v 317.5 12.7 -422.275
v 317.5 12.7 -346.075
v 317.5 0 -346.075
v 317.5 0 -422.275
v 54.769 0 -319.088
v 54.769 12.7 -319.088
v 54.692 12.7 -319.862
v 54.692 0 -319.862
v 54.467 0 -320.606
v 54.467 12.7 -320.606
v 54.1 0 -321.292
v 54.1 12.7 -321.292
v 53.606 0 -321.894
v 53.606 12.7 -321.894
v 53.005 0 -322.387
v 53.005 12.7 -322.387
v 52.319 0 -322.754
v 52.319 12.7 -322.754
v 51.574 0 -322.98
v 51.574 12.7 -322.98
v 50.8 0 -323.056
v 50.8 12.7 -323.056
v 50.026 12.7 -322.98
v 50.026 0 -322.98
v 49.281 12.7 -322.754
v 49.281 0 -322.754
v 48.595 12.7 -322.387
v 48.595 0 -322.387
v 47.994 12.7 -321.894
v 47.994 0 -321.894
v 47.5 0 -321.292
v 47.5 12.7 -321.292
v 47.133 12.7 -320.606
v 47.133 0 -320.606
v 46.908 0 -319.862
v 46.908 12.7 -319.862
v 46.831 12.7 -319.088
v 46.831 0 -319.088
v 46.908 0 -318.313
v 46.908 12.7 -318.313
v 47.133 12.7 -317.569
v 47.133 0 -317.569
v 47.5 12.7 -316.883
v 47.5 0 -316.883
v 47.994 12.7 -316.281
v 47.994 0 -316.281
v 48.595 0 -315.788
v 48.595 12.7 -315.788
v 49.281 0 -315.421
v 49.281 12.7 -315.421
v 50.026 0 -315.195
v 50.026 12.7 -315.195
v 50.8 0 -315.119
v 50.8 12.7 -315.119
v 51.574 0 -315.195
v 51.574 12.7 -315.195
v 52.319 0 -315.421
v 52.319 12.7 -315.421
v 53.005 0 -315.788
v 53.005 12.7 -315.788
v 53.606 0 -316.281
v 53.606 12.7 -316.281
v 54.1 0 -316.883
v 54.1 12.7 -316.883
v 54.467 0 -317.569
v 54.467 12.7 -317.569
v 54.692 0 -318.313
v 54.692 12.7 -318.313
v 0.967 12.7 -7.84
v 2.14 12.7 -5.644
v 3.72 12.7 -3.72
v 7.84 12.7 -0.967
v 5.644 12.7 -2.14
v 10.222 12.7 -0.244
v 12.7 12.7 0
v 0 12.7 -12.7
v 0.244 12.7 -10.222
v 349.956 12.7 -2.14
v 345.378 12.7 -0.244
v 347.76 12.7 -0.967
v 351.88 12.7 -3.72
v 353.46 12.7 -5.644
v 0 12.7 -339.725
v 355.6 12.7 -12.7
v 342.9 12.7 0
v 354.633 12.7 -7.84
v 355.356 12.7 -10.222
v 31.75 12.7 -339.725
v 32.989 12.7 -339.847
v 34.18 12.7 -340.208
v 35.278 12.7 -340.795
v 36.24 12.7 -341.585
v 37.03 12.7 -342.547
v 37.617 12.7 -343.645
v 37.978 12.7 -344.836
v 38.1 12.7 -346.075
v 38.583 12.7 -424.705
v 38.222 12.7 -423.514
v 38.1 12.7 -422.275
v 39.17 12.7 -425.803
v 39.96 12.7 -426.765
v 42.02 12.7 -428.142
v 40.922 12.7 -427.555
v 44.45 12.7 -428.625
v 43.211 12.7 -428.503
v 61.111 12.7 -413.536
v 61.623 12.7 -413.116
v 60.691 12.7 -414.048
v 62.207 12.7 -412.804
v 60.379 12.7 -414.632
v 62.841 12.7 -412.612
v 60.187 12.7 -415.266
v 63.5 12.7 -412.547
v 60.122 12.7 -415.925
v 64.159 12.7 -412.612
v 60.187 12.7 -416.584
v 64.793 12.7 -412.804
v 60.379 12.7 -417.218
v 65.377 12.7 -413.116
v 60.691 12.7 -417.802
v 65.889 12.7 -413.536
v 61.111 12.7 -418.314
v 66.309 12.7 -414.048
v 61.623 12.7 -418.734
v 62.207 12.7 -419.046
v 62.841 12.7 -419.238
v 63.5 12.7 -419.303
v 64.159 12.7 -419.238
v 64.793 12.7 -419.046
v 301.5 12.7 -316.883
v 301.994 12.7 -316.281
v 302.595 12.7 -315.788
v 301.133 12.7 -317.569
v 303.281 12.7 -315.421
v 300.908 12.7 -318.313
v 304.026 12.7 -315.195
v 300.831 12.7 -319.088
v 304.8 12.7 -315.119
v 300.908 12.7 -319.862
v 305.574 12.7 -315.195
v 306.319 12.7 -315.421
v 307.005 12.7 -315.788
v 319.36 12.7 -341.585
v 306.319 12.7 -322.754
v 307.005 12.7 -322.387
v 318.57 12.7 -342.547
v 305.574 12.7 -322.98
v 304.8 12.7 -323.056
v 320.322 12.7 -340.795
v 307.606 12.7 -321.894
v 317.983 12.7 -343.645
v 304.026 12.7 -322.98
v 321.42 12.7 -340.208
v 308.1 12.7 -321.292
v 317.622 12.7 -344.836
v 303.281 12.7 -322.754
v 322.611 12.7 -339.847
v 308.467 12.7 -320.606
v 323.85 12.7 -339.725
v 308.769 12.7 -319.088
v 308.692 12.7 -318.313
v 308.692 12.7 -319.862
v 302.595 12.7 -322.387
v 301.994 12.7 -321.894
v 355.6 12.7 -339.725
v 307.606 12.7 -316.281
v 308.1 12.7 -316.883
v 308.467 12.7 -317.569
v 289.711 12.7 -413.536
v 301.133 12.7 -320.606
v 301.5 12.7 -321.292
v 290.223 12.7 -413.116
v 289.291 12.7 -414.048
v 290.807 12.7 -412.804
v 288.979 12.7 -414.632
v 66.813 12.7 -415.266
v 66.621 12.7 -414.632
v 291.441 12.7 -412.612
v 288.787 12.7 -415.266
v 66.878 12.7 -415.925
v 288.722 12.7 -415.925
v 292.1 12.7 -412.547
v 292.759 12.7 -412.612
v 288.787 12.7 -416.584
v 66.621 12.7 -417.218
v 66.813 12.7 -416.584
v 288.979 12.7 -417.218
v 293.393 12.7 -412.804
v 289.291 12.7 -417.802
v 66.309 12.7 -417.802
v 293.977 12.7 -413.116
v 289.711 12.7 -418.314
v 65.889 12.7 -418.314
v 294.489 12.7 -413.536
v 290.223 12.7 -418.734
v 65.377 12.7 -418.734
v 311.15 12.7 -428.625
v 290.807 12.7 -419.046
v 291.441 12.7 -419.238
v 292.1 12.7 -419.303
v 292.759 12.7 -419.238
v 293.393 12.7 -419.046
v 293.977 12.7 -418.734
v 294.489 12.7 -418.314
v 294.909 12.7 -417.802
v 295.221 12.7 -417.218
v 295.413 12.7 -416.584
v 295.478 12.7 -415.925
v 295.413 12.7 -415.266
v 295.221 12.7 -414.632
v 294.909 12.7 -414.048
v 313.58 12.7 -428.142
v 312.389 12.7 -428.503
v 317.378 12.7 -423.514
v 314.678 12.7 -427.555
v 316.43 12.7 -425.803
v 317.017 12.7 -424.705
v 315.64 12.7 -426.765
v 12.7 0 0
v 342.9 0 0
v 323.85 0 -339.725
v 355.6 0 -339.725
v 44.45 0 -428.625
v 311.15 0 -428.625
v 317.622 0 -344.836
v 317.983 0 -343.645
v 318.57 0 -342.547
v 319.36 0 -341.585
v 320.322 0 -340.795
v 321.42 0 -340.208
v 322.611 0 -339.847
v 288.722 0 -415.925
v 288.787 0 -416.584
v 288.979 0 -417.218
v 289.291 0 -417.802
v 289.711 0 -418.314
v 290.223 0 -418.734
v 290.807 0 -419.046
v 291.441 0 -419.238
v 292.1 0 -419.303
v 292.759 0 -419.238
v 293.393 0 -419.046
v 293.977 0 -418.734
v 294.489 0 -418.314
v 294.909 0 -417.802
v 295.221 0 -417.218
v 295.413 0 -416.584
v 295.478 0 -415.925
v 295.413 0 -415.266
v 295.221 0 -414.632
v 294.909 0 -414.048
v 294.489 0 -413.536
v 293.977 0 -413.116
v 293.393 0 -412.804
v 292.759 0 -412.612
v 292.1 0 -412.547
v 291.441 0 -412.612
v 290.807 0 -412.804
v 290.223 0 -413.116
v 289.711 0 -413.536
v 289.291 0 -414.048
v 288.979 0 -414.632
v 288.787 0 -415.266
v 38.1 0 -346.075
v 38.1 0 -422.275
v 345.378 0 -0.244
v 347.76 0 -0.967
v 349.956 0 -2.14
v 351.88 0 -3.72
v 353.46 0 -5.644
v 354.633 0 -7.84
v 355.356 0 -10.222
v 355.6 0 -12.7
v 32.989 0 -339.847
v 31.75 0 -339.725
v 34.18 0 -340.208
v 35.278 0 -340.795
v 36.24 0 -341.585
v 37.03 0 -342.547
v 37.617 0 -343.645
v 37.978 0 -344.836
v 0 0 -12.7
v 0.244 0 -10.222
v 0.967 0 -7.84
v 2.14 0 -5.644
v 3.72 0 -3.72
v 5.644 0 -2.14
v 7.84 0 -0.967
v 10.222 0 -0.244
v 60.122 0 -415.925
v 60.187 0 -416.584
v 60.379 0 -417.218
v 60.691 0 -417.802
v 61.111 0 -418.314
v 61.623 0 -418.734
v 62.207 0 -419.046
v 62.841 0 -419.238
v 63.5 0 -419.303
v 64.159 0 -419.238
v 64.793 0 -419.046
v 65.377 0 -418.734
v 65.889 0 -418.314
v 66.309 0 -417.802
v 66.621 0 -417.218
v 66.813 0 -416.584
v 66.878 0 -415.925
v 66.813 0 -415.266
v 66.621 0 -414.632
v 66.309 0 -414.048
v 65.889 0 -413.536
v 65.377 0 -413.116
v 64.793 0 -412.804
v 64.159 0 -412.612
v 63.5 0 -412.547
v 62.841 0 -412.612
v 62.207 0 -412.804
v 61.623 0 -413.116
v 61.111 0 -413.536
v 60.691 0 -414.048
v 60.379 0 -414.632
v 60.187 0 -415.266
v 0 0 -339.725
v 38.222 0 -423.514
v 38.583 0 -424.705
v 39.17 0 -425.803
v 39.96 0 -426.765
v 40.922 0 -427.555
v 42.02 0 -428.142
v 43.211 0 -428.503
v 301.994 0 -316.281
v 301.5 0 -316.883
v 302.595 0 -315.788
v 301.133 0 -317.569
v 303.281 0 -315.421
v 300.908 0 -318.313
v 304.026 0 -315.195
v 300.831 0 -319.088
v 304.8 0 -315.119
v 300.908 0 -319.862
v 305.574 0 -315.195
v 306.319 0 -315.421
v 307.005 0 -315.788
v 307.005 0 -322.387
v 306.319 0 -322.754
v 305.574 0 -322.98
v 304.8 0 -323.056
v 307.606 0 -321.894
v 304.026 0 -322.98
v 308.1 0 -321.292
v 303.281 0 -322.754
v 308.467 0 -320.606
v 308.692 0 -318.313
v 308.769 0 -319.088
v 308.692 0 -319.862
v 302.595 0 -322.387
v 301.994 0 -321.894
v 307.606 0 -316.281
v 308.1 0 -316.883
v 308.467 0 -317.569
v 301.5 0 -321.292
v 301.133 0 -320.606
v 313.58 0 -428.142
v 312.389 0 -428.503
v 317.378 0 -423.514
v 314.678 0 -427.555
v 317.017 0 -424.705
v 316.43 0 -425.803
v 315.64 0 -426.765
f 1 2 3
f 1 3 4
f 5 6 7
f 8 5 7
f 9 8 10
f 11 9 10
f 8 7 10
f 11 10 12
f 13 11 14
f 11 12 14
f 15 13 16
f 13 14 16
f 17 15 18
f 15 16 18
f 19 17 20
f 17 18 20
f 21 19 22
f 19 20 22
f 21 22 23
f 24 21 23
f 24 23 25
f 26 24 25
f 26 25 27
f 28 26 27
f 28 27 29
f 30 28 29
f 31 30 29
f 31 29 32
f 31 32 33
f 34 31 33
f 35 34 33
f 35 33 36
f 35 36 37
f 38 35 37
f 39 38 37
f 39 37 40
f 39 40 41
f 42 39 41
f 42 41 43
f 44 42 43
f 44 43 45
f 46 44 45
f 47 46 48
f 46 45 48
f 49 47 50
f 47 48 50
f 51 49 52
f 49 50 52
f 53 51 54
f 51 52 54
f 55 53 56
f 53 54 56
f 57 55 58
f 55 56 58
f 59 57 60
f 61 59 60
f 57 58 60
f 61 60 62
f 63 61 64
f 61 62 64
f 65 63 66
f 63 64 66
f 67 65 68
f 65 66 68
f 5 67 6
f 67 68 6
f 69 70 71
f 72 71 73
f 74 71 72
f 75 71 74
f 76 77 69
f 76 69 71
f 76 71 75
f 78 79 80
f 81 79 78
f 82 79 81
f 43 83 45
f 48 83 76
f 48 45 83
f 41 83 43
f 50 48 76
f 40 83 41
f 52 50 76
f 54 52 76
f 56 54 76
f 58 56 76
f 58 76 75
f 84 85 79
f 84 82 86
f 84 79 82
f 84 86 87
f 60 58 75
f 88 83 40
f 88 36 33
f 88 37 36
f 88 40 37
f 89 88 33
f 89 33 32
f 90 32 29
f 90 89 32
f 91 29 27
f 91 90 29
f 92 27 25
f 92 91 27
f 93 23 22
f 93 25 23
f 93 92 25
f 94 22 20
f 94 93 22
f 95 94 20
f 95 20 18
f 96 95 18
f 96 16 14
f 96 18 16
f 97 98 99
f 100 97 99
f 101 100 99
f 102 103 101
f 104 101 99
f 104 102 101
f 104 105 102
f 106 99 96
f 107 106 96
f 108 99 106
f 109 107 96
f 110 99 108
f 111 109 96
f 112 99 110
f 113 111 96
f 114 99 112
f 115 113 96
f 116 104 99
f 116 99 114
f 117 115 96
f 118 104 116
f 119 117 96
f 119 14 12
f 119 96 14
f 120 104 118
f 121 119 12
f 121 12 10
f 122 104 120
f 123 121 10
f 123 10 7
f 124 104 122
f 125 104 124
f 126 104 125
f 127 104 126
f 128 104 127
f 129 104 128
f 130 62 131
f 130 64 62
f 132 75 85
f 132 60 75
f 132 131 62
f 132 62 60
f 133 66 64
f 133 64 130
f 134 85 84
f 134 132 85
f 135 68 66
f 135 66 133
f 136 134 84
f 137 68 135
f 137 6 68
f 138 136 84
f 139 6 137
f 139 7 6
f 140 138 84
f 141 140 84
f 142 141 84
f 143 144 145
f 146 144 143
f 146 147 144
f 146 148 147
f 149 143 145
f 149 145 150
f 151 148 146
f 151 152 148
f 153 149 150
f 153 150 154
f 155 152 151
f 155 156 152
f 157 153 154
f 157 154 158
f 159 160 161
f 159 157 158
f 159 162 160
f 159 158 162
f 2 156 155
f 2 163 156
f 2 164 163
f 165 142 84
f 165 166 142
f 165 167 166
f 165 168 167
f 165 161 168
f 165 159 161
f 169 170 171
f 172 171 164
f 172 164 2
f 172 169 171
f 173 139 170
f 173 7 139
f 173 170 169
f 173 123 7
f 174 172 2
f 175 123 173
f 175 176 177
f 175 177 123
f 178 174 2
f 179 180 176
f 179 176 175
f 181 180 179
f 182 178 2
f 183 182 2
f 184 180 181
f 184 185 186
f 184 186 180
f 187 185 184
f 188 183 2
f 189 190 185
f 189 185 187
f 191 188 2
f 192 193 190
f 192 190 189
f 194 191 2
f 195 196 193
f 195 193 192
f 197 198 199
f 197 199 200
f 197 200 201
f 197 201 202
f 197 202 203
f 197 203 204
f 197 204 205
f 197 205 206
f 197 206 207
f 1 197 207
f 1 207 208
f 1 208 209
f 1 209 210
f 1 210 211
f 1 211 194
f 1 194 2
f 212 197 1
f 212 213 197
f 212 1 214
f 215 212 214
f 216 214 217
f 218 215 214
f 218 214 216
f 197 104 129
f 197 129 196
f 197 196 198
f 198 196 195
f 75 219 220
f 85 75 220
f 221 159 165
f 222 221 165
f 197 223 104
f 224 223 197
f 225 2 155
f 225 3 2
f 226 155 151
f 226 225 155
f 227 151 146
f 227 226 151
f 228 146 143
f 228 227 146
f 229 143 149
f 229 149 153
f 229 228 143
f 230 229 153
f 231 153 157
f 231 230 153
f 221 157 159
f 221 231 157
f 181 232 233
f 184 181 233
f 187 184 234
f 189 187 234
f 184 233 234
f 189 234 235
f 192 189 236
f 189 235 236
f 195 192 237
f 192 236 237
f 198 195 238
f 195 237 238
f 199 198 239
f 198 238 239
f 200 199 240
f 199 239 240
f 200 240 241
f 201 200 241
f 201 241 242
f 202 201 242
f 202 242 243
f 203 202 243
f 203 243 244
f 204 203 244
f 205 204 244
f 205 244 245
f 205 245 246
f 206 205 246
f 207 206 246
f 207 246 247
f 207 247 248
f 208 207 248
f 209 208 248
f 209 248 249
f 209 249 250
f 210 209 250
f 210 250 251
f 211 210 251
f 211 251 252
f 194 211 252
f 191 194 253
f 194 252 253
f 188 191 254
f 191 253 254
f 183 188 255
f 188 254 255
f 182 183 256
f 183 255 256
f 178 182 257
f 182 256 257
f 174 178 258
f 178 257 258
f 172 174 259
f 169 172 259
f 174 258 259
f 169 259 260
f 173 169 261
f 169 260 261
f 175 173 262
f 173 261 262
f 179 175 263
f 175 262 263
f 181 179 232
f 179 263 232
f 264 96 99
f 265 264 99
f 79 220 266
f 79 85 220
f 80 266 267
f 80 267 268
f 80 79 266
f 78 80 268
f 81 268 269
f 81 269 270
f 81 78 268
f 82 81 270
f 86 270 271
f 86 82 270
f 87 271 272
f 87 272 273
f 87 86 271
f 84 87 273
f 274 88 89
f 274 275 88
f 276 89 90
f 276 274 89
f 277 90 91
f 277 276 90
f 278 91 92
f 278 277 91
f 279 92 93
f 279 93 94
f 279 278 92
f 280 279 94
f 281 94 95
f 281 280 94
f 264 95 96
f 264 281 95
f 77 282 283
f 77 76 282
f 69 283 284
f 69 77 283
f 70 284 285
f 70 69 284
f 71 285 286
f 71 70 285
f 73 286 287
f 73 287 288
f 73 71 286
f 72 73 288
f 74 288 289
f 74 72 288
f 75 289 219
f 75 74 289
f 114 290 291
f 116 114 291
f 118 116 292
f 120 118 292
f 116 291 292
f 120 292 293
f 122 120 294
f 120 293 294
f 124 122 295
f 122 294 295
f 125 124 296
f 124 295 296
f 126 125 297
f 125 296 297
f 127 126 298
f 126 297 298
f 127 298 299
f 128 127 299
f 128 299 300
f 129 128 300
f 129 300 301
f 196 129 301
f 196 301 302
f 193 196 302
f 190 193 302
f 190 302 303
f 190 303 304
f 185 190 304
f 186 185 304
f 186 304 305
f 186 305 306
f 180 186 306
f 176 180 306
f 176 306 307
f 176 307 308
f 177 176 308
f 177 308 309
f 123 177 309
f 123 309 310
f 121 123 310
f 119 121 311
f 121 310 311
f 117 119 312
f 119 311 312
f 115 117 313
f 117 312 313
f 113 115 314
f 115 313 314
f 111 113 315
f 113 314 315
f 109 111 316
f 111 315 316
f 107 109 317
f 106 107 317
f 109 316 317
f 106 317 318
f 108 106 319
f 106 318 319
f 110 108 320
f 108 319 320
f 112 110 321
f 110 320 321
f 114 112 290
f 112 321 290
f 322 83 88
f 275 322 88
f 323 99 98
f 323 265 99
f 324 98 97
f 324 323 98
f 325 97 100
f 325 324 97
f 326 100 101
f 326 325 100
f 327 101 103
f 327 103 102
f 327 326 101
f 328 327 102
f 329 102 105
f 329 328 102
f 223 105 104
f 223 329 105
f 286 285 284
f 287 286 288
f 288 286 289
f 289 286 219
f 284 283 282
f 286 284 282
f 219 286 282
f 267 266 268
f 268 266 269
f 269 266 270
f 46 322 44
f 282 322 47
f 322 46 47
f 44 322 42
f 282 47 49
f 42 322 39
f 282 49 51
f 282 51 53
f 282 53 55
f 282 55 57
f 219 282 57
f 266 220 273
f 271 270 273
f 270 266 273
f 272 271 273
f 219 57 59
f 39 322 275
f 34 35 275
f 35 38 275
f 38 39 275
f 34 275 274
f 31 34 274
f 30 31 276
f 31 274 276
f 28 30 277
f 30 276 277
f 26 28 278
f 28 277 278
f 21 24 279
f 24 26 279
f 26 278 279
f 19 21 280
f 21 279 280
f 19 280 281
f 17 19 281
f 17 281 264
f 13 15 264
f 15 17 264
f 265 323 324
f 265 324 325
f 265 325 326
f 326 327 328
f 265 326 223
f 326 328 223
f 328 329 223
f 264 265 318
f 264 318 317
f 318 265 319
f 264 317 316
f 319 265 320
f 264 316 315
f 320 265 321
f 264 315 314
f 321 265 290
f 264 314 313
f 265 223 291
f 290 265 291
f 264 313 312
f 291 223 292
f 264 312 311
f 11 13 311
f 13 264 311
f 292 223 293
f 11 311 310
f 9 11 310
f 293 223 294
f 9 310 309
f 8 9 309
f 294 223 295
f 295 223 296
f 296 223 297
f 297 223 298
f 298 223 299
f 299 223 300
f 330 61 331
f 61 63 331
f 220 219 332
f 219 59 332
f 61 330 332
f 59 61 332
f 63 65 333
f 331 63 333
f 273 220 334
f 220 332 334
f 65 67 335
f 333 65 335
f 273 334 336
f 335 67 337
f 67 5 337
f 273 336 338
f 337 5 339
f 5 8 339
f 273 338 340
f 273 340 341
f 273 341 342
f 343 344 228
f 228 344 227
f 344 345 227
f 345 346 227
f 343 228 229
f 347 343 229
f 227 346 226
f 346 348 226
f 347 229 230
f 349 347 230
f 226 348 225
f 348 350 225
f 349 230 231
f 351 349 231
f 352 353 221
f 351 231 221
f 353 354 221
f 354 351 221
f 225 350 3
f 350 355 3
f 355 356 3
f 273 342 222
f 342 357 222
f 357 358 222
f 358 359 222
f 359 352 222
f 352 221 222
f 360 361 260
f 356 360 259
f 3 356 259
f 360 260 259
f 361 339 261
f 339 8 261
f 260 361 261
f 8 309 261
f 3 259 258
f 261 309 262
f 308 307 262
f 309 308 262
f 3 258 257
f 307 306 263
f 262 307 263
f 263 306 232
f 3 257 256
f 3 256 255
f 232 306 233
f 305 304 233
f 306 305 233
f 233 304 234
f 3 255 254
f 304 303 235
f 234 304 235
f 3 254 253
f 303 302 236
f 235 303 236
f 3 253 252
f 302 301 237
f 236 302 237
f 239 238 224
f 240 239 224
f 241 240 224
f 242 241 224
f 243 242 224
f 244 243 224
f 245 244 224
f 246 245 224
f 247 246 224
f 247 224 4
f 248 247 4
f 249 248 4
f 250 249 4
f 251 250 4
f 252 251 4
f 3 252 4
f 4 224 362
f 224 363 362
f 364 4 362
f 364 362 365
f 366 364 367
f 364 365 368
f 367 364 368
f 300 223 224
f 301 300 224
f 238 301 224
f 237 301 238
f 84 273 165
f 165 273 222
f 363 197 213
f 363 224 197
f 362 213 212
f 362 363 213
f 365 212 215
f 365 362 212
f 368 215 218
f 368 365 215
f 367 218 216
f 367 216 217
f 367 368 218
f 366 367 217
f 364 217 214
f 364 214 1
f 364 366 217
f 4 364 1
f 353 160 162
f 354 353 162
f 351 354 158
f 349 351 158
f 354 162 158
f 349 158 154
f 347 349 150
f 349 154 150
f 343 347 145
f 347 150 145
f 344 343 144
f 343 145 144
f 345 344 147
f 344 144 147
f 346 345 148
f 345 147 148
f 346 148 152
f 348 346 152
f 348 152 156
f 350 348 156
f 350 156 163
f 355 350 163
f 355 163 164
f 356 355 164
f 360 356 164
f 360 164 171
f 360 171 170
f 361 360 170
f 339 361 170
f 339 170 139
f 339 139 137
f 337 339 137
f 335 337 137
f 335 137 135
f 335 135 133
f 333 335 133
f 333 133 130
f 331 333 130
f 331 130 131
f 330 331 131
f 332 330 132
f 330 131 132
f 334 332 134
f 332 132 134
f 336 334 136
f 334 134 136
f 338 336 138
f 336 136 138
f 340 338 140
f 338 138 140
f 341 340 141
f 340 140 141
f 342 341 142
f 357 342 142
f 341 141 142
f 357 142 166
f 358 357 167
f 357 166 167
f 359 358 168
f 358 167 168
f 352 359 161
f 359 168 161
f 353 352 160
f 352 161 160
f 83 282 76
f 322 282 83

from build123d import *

# Parameters (mm, degrees)
SKETCH1_W                      = 355.6
SKETCH1_H                      = 428.625
BOSS_EXTRUDE1_DEPTH            = 12.7
FILLET1_R                      = 12.7
SKETCH3_W                      = 38.1
SKETCH3_H                      = 88.9
CUT_EXTRUDE2_DEPTH             = 558.074537764
FILLET2_R                      = 6.35
H_0_266_DIAMETER_HOLE1_D       = 6.7564
F_5_16_0_3125_DIAMETER_HOLE1_D = 7.9375


with BuildPart() as part:
    # Sketch1 → Boss-Extrude1 (new body)
    with BuildSketch(Plane(origin=(0, 0, 0), x_dir=(1, 0, 0), z_dir=(0, 1, 0))):
        with Locations((177.8, 214.3125)):
            Rectangle(SKETCH1_W, SKETCH1_H)
    extrude(amount=BOSS_EXTRUDE1_DEPTH)

    # Fillet1
    fillet1_edges = [part.edges().sort_by_distance(p)[0] for p in [
        (355.6, 6.35, 0),
        (0, 6.35, 0),
    ]]
    fillet(fillet1_edges, radius=FILLET1_R)

    # Sketch3 → Cut-Extrude2 (cut, through all)
    with BuildSketch(Plane(origin=(0, 12.7, 0), x_dir=(1, 0, 0), z_dir=(0, 1, 0))):
        with Locations((19.05, 384.175)):
            Rectangle(SKETCH3_W, SKETCH3_H)
        with Locations((336.55, 384.175)):
            Rectangle(SKETCH3_W, SKETCH3_H)
    extrude(amount=-CUT_EXTRUDE2_DEPTH, mode=Mode.SUBTRACT)

    # Fillet2
    fillet2_edges = [part.edges().sort_by_distance(p)[0] for p in [
        (38.1, 6.35, -428.625),
        (38.1, 6.35, -339.725),
        (317.5, 6.35, -428.625),
        (317.5, 6.35, -339.725),
    ]]
    fillet(fillet2_edges, radius=FILLET2_R)

    # H (0.266) Diameter Hole1 (through all)
    with Locations(Plane(origin=(0, 12.7, 0), x_dir=(1, 0, 0), z_dir=(0, 1, 0))):
        with Locations((63.5, 415.925), (292.1, 415.925)):
            Hole(H_0_266_DIAMETER_HOLE1_D / 2)

    # 5/16 (0.3125) Diameter Hole1 (through all)
    with Locations(Plane(origin=(0, 0, 0), x_dir=(-1, 0, 0), z_dir=(0, -1, 0))):
        with Locations((-50.8, 319.0875), (-304.8, 319.0875)):
            Hole(F_5_16_0_3125_DIAMETER_HOLE1_D / 2)


solid = part.part
